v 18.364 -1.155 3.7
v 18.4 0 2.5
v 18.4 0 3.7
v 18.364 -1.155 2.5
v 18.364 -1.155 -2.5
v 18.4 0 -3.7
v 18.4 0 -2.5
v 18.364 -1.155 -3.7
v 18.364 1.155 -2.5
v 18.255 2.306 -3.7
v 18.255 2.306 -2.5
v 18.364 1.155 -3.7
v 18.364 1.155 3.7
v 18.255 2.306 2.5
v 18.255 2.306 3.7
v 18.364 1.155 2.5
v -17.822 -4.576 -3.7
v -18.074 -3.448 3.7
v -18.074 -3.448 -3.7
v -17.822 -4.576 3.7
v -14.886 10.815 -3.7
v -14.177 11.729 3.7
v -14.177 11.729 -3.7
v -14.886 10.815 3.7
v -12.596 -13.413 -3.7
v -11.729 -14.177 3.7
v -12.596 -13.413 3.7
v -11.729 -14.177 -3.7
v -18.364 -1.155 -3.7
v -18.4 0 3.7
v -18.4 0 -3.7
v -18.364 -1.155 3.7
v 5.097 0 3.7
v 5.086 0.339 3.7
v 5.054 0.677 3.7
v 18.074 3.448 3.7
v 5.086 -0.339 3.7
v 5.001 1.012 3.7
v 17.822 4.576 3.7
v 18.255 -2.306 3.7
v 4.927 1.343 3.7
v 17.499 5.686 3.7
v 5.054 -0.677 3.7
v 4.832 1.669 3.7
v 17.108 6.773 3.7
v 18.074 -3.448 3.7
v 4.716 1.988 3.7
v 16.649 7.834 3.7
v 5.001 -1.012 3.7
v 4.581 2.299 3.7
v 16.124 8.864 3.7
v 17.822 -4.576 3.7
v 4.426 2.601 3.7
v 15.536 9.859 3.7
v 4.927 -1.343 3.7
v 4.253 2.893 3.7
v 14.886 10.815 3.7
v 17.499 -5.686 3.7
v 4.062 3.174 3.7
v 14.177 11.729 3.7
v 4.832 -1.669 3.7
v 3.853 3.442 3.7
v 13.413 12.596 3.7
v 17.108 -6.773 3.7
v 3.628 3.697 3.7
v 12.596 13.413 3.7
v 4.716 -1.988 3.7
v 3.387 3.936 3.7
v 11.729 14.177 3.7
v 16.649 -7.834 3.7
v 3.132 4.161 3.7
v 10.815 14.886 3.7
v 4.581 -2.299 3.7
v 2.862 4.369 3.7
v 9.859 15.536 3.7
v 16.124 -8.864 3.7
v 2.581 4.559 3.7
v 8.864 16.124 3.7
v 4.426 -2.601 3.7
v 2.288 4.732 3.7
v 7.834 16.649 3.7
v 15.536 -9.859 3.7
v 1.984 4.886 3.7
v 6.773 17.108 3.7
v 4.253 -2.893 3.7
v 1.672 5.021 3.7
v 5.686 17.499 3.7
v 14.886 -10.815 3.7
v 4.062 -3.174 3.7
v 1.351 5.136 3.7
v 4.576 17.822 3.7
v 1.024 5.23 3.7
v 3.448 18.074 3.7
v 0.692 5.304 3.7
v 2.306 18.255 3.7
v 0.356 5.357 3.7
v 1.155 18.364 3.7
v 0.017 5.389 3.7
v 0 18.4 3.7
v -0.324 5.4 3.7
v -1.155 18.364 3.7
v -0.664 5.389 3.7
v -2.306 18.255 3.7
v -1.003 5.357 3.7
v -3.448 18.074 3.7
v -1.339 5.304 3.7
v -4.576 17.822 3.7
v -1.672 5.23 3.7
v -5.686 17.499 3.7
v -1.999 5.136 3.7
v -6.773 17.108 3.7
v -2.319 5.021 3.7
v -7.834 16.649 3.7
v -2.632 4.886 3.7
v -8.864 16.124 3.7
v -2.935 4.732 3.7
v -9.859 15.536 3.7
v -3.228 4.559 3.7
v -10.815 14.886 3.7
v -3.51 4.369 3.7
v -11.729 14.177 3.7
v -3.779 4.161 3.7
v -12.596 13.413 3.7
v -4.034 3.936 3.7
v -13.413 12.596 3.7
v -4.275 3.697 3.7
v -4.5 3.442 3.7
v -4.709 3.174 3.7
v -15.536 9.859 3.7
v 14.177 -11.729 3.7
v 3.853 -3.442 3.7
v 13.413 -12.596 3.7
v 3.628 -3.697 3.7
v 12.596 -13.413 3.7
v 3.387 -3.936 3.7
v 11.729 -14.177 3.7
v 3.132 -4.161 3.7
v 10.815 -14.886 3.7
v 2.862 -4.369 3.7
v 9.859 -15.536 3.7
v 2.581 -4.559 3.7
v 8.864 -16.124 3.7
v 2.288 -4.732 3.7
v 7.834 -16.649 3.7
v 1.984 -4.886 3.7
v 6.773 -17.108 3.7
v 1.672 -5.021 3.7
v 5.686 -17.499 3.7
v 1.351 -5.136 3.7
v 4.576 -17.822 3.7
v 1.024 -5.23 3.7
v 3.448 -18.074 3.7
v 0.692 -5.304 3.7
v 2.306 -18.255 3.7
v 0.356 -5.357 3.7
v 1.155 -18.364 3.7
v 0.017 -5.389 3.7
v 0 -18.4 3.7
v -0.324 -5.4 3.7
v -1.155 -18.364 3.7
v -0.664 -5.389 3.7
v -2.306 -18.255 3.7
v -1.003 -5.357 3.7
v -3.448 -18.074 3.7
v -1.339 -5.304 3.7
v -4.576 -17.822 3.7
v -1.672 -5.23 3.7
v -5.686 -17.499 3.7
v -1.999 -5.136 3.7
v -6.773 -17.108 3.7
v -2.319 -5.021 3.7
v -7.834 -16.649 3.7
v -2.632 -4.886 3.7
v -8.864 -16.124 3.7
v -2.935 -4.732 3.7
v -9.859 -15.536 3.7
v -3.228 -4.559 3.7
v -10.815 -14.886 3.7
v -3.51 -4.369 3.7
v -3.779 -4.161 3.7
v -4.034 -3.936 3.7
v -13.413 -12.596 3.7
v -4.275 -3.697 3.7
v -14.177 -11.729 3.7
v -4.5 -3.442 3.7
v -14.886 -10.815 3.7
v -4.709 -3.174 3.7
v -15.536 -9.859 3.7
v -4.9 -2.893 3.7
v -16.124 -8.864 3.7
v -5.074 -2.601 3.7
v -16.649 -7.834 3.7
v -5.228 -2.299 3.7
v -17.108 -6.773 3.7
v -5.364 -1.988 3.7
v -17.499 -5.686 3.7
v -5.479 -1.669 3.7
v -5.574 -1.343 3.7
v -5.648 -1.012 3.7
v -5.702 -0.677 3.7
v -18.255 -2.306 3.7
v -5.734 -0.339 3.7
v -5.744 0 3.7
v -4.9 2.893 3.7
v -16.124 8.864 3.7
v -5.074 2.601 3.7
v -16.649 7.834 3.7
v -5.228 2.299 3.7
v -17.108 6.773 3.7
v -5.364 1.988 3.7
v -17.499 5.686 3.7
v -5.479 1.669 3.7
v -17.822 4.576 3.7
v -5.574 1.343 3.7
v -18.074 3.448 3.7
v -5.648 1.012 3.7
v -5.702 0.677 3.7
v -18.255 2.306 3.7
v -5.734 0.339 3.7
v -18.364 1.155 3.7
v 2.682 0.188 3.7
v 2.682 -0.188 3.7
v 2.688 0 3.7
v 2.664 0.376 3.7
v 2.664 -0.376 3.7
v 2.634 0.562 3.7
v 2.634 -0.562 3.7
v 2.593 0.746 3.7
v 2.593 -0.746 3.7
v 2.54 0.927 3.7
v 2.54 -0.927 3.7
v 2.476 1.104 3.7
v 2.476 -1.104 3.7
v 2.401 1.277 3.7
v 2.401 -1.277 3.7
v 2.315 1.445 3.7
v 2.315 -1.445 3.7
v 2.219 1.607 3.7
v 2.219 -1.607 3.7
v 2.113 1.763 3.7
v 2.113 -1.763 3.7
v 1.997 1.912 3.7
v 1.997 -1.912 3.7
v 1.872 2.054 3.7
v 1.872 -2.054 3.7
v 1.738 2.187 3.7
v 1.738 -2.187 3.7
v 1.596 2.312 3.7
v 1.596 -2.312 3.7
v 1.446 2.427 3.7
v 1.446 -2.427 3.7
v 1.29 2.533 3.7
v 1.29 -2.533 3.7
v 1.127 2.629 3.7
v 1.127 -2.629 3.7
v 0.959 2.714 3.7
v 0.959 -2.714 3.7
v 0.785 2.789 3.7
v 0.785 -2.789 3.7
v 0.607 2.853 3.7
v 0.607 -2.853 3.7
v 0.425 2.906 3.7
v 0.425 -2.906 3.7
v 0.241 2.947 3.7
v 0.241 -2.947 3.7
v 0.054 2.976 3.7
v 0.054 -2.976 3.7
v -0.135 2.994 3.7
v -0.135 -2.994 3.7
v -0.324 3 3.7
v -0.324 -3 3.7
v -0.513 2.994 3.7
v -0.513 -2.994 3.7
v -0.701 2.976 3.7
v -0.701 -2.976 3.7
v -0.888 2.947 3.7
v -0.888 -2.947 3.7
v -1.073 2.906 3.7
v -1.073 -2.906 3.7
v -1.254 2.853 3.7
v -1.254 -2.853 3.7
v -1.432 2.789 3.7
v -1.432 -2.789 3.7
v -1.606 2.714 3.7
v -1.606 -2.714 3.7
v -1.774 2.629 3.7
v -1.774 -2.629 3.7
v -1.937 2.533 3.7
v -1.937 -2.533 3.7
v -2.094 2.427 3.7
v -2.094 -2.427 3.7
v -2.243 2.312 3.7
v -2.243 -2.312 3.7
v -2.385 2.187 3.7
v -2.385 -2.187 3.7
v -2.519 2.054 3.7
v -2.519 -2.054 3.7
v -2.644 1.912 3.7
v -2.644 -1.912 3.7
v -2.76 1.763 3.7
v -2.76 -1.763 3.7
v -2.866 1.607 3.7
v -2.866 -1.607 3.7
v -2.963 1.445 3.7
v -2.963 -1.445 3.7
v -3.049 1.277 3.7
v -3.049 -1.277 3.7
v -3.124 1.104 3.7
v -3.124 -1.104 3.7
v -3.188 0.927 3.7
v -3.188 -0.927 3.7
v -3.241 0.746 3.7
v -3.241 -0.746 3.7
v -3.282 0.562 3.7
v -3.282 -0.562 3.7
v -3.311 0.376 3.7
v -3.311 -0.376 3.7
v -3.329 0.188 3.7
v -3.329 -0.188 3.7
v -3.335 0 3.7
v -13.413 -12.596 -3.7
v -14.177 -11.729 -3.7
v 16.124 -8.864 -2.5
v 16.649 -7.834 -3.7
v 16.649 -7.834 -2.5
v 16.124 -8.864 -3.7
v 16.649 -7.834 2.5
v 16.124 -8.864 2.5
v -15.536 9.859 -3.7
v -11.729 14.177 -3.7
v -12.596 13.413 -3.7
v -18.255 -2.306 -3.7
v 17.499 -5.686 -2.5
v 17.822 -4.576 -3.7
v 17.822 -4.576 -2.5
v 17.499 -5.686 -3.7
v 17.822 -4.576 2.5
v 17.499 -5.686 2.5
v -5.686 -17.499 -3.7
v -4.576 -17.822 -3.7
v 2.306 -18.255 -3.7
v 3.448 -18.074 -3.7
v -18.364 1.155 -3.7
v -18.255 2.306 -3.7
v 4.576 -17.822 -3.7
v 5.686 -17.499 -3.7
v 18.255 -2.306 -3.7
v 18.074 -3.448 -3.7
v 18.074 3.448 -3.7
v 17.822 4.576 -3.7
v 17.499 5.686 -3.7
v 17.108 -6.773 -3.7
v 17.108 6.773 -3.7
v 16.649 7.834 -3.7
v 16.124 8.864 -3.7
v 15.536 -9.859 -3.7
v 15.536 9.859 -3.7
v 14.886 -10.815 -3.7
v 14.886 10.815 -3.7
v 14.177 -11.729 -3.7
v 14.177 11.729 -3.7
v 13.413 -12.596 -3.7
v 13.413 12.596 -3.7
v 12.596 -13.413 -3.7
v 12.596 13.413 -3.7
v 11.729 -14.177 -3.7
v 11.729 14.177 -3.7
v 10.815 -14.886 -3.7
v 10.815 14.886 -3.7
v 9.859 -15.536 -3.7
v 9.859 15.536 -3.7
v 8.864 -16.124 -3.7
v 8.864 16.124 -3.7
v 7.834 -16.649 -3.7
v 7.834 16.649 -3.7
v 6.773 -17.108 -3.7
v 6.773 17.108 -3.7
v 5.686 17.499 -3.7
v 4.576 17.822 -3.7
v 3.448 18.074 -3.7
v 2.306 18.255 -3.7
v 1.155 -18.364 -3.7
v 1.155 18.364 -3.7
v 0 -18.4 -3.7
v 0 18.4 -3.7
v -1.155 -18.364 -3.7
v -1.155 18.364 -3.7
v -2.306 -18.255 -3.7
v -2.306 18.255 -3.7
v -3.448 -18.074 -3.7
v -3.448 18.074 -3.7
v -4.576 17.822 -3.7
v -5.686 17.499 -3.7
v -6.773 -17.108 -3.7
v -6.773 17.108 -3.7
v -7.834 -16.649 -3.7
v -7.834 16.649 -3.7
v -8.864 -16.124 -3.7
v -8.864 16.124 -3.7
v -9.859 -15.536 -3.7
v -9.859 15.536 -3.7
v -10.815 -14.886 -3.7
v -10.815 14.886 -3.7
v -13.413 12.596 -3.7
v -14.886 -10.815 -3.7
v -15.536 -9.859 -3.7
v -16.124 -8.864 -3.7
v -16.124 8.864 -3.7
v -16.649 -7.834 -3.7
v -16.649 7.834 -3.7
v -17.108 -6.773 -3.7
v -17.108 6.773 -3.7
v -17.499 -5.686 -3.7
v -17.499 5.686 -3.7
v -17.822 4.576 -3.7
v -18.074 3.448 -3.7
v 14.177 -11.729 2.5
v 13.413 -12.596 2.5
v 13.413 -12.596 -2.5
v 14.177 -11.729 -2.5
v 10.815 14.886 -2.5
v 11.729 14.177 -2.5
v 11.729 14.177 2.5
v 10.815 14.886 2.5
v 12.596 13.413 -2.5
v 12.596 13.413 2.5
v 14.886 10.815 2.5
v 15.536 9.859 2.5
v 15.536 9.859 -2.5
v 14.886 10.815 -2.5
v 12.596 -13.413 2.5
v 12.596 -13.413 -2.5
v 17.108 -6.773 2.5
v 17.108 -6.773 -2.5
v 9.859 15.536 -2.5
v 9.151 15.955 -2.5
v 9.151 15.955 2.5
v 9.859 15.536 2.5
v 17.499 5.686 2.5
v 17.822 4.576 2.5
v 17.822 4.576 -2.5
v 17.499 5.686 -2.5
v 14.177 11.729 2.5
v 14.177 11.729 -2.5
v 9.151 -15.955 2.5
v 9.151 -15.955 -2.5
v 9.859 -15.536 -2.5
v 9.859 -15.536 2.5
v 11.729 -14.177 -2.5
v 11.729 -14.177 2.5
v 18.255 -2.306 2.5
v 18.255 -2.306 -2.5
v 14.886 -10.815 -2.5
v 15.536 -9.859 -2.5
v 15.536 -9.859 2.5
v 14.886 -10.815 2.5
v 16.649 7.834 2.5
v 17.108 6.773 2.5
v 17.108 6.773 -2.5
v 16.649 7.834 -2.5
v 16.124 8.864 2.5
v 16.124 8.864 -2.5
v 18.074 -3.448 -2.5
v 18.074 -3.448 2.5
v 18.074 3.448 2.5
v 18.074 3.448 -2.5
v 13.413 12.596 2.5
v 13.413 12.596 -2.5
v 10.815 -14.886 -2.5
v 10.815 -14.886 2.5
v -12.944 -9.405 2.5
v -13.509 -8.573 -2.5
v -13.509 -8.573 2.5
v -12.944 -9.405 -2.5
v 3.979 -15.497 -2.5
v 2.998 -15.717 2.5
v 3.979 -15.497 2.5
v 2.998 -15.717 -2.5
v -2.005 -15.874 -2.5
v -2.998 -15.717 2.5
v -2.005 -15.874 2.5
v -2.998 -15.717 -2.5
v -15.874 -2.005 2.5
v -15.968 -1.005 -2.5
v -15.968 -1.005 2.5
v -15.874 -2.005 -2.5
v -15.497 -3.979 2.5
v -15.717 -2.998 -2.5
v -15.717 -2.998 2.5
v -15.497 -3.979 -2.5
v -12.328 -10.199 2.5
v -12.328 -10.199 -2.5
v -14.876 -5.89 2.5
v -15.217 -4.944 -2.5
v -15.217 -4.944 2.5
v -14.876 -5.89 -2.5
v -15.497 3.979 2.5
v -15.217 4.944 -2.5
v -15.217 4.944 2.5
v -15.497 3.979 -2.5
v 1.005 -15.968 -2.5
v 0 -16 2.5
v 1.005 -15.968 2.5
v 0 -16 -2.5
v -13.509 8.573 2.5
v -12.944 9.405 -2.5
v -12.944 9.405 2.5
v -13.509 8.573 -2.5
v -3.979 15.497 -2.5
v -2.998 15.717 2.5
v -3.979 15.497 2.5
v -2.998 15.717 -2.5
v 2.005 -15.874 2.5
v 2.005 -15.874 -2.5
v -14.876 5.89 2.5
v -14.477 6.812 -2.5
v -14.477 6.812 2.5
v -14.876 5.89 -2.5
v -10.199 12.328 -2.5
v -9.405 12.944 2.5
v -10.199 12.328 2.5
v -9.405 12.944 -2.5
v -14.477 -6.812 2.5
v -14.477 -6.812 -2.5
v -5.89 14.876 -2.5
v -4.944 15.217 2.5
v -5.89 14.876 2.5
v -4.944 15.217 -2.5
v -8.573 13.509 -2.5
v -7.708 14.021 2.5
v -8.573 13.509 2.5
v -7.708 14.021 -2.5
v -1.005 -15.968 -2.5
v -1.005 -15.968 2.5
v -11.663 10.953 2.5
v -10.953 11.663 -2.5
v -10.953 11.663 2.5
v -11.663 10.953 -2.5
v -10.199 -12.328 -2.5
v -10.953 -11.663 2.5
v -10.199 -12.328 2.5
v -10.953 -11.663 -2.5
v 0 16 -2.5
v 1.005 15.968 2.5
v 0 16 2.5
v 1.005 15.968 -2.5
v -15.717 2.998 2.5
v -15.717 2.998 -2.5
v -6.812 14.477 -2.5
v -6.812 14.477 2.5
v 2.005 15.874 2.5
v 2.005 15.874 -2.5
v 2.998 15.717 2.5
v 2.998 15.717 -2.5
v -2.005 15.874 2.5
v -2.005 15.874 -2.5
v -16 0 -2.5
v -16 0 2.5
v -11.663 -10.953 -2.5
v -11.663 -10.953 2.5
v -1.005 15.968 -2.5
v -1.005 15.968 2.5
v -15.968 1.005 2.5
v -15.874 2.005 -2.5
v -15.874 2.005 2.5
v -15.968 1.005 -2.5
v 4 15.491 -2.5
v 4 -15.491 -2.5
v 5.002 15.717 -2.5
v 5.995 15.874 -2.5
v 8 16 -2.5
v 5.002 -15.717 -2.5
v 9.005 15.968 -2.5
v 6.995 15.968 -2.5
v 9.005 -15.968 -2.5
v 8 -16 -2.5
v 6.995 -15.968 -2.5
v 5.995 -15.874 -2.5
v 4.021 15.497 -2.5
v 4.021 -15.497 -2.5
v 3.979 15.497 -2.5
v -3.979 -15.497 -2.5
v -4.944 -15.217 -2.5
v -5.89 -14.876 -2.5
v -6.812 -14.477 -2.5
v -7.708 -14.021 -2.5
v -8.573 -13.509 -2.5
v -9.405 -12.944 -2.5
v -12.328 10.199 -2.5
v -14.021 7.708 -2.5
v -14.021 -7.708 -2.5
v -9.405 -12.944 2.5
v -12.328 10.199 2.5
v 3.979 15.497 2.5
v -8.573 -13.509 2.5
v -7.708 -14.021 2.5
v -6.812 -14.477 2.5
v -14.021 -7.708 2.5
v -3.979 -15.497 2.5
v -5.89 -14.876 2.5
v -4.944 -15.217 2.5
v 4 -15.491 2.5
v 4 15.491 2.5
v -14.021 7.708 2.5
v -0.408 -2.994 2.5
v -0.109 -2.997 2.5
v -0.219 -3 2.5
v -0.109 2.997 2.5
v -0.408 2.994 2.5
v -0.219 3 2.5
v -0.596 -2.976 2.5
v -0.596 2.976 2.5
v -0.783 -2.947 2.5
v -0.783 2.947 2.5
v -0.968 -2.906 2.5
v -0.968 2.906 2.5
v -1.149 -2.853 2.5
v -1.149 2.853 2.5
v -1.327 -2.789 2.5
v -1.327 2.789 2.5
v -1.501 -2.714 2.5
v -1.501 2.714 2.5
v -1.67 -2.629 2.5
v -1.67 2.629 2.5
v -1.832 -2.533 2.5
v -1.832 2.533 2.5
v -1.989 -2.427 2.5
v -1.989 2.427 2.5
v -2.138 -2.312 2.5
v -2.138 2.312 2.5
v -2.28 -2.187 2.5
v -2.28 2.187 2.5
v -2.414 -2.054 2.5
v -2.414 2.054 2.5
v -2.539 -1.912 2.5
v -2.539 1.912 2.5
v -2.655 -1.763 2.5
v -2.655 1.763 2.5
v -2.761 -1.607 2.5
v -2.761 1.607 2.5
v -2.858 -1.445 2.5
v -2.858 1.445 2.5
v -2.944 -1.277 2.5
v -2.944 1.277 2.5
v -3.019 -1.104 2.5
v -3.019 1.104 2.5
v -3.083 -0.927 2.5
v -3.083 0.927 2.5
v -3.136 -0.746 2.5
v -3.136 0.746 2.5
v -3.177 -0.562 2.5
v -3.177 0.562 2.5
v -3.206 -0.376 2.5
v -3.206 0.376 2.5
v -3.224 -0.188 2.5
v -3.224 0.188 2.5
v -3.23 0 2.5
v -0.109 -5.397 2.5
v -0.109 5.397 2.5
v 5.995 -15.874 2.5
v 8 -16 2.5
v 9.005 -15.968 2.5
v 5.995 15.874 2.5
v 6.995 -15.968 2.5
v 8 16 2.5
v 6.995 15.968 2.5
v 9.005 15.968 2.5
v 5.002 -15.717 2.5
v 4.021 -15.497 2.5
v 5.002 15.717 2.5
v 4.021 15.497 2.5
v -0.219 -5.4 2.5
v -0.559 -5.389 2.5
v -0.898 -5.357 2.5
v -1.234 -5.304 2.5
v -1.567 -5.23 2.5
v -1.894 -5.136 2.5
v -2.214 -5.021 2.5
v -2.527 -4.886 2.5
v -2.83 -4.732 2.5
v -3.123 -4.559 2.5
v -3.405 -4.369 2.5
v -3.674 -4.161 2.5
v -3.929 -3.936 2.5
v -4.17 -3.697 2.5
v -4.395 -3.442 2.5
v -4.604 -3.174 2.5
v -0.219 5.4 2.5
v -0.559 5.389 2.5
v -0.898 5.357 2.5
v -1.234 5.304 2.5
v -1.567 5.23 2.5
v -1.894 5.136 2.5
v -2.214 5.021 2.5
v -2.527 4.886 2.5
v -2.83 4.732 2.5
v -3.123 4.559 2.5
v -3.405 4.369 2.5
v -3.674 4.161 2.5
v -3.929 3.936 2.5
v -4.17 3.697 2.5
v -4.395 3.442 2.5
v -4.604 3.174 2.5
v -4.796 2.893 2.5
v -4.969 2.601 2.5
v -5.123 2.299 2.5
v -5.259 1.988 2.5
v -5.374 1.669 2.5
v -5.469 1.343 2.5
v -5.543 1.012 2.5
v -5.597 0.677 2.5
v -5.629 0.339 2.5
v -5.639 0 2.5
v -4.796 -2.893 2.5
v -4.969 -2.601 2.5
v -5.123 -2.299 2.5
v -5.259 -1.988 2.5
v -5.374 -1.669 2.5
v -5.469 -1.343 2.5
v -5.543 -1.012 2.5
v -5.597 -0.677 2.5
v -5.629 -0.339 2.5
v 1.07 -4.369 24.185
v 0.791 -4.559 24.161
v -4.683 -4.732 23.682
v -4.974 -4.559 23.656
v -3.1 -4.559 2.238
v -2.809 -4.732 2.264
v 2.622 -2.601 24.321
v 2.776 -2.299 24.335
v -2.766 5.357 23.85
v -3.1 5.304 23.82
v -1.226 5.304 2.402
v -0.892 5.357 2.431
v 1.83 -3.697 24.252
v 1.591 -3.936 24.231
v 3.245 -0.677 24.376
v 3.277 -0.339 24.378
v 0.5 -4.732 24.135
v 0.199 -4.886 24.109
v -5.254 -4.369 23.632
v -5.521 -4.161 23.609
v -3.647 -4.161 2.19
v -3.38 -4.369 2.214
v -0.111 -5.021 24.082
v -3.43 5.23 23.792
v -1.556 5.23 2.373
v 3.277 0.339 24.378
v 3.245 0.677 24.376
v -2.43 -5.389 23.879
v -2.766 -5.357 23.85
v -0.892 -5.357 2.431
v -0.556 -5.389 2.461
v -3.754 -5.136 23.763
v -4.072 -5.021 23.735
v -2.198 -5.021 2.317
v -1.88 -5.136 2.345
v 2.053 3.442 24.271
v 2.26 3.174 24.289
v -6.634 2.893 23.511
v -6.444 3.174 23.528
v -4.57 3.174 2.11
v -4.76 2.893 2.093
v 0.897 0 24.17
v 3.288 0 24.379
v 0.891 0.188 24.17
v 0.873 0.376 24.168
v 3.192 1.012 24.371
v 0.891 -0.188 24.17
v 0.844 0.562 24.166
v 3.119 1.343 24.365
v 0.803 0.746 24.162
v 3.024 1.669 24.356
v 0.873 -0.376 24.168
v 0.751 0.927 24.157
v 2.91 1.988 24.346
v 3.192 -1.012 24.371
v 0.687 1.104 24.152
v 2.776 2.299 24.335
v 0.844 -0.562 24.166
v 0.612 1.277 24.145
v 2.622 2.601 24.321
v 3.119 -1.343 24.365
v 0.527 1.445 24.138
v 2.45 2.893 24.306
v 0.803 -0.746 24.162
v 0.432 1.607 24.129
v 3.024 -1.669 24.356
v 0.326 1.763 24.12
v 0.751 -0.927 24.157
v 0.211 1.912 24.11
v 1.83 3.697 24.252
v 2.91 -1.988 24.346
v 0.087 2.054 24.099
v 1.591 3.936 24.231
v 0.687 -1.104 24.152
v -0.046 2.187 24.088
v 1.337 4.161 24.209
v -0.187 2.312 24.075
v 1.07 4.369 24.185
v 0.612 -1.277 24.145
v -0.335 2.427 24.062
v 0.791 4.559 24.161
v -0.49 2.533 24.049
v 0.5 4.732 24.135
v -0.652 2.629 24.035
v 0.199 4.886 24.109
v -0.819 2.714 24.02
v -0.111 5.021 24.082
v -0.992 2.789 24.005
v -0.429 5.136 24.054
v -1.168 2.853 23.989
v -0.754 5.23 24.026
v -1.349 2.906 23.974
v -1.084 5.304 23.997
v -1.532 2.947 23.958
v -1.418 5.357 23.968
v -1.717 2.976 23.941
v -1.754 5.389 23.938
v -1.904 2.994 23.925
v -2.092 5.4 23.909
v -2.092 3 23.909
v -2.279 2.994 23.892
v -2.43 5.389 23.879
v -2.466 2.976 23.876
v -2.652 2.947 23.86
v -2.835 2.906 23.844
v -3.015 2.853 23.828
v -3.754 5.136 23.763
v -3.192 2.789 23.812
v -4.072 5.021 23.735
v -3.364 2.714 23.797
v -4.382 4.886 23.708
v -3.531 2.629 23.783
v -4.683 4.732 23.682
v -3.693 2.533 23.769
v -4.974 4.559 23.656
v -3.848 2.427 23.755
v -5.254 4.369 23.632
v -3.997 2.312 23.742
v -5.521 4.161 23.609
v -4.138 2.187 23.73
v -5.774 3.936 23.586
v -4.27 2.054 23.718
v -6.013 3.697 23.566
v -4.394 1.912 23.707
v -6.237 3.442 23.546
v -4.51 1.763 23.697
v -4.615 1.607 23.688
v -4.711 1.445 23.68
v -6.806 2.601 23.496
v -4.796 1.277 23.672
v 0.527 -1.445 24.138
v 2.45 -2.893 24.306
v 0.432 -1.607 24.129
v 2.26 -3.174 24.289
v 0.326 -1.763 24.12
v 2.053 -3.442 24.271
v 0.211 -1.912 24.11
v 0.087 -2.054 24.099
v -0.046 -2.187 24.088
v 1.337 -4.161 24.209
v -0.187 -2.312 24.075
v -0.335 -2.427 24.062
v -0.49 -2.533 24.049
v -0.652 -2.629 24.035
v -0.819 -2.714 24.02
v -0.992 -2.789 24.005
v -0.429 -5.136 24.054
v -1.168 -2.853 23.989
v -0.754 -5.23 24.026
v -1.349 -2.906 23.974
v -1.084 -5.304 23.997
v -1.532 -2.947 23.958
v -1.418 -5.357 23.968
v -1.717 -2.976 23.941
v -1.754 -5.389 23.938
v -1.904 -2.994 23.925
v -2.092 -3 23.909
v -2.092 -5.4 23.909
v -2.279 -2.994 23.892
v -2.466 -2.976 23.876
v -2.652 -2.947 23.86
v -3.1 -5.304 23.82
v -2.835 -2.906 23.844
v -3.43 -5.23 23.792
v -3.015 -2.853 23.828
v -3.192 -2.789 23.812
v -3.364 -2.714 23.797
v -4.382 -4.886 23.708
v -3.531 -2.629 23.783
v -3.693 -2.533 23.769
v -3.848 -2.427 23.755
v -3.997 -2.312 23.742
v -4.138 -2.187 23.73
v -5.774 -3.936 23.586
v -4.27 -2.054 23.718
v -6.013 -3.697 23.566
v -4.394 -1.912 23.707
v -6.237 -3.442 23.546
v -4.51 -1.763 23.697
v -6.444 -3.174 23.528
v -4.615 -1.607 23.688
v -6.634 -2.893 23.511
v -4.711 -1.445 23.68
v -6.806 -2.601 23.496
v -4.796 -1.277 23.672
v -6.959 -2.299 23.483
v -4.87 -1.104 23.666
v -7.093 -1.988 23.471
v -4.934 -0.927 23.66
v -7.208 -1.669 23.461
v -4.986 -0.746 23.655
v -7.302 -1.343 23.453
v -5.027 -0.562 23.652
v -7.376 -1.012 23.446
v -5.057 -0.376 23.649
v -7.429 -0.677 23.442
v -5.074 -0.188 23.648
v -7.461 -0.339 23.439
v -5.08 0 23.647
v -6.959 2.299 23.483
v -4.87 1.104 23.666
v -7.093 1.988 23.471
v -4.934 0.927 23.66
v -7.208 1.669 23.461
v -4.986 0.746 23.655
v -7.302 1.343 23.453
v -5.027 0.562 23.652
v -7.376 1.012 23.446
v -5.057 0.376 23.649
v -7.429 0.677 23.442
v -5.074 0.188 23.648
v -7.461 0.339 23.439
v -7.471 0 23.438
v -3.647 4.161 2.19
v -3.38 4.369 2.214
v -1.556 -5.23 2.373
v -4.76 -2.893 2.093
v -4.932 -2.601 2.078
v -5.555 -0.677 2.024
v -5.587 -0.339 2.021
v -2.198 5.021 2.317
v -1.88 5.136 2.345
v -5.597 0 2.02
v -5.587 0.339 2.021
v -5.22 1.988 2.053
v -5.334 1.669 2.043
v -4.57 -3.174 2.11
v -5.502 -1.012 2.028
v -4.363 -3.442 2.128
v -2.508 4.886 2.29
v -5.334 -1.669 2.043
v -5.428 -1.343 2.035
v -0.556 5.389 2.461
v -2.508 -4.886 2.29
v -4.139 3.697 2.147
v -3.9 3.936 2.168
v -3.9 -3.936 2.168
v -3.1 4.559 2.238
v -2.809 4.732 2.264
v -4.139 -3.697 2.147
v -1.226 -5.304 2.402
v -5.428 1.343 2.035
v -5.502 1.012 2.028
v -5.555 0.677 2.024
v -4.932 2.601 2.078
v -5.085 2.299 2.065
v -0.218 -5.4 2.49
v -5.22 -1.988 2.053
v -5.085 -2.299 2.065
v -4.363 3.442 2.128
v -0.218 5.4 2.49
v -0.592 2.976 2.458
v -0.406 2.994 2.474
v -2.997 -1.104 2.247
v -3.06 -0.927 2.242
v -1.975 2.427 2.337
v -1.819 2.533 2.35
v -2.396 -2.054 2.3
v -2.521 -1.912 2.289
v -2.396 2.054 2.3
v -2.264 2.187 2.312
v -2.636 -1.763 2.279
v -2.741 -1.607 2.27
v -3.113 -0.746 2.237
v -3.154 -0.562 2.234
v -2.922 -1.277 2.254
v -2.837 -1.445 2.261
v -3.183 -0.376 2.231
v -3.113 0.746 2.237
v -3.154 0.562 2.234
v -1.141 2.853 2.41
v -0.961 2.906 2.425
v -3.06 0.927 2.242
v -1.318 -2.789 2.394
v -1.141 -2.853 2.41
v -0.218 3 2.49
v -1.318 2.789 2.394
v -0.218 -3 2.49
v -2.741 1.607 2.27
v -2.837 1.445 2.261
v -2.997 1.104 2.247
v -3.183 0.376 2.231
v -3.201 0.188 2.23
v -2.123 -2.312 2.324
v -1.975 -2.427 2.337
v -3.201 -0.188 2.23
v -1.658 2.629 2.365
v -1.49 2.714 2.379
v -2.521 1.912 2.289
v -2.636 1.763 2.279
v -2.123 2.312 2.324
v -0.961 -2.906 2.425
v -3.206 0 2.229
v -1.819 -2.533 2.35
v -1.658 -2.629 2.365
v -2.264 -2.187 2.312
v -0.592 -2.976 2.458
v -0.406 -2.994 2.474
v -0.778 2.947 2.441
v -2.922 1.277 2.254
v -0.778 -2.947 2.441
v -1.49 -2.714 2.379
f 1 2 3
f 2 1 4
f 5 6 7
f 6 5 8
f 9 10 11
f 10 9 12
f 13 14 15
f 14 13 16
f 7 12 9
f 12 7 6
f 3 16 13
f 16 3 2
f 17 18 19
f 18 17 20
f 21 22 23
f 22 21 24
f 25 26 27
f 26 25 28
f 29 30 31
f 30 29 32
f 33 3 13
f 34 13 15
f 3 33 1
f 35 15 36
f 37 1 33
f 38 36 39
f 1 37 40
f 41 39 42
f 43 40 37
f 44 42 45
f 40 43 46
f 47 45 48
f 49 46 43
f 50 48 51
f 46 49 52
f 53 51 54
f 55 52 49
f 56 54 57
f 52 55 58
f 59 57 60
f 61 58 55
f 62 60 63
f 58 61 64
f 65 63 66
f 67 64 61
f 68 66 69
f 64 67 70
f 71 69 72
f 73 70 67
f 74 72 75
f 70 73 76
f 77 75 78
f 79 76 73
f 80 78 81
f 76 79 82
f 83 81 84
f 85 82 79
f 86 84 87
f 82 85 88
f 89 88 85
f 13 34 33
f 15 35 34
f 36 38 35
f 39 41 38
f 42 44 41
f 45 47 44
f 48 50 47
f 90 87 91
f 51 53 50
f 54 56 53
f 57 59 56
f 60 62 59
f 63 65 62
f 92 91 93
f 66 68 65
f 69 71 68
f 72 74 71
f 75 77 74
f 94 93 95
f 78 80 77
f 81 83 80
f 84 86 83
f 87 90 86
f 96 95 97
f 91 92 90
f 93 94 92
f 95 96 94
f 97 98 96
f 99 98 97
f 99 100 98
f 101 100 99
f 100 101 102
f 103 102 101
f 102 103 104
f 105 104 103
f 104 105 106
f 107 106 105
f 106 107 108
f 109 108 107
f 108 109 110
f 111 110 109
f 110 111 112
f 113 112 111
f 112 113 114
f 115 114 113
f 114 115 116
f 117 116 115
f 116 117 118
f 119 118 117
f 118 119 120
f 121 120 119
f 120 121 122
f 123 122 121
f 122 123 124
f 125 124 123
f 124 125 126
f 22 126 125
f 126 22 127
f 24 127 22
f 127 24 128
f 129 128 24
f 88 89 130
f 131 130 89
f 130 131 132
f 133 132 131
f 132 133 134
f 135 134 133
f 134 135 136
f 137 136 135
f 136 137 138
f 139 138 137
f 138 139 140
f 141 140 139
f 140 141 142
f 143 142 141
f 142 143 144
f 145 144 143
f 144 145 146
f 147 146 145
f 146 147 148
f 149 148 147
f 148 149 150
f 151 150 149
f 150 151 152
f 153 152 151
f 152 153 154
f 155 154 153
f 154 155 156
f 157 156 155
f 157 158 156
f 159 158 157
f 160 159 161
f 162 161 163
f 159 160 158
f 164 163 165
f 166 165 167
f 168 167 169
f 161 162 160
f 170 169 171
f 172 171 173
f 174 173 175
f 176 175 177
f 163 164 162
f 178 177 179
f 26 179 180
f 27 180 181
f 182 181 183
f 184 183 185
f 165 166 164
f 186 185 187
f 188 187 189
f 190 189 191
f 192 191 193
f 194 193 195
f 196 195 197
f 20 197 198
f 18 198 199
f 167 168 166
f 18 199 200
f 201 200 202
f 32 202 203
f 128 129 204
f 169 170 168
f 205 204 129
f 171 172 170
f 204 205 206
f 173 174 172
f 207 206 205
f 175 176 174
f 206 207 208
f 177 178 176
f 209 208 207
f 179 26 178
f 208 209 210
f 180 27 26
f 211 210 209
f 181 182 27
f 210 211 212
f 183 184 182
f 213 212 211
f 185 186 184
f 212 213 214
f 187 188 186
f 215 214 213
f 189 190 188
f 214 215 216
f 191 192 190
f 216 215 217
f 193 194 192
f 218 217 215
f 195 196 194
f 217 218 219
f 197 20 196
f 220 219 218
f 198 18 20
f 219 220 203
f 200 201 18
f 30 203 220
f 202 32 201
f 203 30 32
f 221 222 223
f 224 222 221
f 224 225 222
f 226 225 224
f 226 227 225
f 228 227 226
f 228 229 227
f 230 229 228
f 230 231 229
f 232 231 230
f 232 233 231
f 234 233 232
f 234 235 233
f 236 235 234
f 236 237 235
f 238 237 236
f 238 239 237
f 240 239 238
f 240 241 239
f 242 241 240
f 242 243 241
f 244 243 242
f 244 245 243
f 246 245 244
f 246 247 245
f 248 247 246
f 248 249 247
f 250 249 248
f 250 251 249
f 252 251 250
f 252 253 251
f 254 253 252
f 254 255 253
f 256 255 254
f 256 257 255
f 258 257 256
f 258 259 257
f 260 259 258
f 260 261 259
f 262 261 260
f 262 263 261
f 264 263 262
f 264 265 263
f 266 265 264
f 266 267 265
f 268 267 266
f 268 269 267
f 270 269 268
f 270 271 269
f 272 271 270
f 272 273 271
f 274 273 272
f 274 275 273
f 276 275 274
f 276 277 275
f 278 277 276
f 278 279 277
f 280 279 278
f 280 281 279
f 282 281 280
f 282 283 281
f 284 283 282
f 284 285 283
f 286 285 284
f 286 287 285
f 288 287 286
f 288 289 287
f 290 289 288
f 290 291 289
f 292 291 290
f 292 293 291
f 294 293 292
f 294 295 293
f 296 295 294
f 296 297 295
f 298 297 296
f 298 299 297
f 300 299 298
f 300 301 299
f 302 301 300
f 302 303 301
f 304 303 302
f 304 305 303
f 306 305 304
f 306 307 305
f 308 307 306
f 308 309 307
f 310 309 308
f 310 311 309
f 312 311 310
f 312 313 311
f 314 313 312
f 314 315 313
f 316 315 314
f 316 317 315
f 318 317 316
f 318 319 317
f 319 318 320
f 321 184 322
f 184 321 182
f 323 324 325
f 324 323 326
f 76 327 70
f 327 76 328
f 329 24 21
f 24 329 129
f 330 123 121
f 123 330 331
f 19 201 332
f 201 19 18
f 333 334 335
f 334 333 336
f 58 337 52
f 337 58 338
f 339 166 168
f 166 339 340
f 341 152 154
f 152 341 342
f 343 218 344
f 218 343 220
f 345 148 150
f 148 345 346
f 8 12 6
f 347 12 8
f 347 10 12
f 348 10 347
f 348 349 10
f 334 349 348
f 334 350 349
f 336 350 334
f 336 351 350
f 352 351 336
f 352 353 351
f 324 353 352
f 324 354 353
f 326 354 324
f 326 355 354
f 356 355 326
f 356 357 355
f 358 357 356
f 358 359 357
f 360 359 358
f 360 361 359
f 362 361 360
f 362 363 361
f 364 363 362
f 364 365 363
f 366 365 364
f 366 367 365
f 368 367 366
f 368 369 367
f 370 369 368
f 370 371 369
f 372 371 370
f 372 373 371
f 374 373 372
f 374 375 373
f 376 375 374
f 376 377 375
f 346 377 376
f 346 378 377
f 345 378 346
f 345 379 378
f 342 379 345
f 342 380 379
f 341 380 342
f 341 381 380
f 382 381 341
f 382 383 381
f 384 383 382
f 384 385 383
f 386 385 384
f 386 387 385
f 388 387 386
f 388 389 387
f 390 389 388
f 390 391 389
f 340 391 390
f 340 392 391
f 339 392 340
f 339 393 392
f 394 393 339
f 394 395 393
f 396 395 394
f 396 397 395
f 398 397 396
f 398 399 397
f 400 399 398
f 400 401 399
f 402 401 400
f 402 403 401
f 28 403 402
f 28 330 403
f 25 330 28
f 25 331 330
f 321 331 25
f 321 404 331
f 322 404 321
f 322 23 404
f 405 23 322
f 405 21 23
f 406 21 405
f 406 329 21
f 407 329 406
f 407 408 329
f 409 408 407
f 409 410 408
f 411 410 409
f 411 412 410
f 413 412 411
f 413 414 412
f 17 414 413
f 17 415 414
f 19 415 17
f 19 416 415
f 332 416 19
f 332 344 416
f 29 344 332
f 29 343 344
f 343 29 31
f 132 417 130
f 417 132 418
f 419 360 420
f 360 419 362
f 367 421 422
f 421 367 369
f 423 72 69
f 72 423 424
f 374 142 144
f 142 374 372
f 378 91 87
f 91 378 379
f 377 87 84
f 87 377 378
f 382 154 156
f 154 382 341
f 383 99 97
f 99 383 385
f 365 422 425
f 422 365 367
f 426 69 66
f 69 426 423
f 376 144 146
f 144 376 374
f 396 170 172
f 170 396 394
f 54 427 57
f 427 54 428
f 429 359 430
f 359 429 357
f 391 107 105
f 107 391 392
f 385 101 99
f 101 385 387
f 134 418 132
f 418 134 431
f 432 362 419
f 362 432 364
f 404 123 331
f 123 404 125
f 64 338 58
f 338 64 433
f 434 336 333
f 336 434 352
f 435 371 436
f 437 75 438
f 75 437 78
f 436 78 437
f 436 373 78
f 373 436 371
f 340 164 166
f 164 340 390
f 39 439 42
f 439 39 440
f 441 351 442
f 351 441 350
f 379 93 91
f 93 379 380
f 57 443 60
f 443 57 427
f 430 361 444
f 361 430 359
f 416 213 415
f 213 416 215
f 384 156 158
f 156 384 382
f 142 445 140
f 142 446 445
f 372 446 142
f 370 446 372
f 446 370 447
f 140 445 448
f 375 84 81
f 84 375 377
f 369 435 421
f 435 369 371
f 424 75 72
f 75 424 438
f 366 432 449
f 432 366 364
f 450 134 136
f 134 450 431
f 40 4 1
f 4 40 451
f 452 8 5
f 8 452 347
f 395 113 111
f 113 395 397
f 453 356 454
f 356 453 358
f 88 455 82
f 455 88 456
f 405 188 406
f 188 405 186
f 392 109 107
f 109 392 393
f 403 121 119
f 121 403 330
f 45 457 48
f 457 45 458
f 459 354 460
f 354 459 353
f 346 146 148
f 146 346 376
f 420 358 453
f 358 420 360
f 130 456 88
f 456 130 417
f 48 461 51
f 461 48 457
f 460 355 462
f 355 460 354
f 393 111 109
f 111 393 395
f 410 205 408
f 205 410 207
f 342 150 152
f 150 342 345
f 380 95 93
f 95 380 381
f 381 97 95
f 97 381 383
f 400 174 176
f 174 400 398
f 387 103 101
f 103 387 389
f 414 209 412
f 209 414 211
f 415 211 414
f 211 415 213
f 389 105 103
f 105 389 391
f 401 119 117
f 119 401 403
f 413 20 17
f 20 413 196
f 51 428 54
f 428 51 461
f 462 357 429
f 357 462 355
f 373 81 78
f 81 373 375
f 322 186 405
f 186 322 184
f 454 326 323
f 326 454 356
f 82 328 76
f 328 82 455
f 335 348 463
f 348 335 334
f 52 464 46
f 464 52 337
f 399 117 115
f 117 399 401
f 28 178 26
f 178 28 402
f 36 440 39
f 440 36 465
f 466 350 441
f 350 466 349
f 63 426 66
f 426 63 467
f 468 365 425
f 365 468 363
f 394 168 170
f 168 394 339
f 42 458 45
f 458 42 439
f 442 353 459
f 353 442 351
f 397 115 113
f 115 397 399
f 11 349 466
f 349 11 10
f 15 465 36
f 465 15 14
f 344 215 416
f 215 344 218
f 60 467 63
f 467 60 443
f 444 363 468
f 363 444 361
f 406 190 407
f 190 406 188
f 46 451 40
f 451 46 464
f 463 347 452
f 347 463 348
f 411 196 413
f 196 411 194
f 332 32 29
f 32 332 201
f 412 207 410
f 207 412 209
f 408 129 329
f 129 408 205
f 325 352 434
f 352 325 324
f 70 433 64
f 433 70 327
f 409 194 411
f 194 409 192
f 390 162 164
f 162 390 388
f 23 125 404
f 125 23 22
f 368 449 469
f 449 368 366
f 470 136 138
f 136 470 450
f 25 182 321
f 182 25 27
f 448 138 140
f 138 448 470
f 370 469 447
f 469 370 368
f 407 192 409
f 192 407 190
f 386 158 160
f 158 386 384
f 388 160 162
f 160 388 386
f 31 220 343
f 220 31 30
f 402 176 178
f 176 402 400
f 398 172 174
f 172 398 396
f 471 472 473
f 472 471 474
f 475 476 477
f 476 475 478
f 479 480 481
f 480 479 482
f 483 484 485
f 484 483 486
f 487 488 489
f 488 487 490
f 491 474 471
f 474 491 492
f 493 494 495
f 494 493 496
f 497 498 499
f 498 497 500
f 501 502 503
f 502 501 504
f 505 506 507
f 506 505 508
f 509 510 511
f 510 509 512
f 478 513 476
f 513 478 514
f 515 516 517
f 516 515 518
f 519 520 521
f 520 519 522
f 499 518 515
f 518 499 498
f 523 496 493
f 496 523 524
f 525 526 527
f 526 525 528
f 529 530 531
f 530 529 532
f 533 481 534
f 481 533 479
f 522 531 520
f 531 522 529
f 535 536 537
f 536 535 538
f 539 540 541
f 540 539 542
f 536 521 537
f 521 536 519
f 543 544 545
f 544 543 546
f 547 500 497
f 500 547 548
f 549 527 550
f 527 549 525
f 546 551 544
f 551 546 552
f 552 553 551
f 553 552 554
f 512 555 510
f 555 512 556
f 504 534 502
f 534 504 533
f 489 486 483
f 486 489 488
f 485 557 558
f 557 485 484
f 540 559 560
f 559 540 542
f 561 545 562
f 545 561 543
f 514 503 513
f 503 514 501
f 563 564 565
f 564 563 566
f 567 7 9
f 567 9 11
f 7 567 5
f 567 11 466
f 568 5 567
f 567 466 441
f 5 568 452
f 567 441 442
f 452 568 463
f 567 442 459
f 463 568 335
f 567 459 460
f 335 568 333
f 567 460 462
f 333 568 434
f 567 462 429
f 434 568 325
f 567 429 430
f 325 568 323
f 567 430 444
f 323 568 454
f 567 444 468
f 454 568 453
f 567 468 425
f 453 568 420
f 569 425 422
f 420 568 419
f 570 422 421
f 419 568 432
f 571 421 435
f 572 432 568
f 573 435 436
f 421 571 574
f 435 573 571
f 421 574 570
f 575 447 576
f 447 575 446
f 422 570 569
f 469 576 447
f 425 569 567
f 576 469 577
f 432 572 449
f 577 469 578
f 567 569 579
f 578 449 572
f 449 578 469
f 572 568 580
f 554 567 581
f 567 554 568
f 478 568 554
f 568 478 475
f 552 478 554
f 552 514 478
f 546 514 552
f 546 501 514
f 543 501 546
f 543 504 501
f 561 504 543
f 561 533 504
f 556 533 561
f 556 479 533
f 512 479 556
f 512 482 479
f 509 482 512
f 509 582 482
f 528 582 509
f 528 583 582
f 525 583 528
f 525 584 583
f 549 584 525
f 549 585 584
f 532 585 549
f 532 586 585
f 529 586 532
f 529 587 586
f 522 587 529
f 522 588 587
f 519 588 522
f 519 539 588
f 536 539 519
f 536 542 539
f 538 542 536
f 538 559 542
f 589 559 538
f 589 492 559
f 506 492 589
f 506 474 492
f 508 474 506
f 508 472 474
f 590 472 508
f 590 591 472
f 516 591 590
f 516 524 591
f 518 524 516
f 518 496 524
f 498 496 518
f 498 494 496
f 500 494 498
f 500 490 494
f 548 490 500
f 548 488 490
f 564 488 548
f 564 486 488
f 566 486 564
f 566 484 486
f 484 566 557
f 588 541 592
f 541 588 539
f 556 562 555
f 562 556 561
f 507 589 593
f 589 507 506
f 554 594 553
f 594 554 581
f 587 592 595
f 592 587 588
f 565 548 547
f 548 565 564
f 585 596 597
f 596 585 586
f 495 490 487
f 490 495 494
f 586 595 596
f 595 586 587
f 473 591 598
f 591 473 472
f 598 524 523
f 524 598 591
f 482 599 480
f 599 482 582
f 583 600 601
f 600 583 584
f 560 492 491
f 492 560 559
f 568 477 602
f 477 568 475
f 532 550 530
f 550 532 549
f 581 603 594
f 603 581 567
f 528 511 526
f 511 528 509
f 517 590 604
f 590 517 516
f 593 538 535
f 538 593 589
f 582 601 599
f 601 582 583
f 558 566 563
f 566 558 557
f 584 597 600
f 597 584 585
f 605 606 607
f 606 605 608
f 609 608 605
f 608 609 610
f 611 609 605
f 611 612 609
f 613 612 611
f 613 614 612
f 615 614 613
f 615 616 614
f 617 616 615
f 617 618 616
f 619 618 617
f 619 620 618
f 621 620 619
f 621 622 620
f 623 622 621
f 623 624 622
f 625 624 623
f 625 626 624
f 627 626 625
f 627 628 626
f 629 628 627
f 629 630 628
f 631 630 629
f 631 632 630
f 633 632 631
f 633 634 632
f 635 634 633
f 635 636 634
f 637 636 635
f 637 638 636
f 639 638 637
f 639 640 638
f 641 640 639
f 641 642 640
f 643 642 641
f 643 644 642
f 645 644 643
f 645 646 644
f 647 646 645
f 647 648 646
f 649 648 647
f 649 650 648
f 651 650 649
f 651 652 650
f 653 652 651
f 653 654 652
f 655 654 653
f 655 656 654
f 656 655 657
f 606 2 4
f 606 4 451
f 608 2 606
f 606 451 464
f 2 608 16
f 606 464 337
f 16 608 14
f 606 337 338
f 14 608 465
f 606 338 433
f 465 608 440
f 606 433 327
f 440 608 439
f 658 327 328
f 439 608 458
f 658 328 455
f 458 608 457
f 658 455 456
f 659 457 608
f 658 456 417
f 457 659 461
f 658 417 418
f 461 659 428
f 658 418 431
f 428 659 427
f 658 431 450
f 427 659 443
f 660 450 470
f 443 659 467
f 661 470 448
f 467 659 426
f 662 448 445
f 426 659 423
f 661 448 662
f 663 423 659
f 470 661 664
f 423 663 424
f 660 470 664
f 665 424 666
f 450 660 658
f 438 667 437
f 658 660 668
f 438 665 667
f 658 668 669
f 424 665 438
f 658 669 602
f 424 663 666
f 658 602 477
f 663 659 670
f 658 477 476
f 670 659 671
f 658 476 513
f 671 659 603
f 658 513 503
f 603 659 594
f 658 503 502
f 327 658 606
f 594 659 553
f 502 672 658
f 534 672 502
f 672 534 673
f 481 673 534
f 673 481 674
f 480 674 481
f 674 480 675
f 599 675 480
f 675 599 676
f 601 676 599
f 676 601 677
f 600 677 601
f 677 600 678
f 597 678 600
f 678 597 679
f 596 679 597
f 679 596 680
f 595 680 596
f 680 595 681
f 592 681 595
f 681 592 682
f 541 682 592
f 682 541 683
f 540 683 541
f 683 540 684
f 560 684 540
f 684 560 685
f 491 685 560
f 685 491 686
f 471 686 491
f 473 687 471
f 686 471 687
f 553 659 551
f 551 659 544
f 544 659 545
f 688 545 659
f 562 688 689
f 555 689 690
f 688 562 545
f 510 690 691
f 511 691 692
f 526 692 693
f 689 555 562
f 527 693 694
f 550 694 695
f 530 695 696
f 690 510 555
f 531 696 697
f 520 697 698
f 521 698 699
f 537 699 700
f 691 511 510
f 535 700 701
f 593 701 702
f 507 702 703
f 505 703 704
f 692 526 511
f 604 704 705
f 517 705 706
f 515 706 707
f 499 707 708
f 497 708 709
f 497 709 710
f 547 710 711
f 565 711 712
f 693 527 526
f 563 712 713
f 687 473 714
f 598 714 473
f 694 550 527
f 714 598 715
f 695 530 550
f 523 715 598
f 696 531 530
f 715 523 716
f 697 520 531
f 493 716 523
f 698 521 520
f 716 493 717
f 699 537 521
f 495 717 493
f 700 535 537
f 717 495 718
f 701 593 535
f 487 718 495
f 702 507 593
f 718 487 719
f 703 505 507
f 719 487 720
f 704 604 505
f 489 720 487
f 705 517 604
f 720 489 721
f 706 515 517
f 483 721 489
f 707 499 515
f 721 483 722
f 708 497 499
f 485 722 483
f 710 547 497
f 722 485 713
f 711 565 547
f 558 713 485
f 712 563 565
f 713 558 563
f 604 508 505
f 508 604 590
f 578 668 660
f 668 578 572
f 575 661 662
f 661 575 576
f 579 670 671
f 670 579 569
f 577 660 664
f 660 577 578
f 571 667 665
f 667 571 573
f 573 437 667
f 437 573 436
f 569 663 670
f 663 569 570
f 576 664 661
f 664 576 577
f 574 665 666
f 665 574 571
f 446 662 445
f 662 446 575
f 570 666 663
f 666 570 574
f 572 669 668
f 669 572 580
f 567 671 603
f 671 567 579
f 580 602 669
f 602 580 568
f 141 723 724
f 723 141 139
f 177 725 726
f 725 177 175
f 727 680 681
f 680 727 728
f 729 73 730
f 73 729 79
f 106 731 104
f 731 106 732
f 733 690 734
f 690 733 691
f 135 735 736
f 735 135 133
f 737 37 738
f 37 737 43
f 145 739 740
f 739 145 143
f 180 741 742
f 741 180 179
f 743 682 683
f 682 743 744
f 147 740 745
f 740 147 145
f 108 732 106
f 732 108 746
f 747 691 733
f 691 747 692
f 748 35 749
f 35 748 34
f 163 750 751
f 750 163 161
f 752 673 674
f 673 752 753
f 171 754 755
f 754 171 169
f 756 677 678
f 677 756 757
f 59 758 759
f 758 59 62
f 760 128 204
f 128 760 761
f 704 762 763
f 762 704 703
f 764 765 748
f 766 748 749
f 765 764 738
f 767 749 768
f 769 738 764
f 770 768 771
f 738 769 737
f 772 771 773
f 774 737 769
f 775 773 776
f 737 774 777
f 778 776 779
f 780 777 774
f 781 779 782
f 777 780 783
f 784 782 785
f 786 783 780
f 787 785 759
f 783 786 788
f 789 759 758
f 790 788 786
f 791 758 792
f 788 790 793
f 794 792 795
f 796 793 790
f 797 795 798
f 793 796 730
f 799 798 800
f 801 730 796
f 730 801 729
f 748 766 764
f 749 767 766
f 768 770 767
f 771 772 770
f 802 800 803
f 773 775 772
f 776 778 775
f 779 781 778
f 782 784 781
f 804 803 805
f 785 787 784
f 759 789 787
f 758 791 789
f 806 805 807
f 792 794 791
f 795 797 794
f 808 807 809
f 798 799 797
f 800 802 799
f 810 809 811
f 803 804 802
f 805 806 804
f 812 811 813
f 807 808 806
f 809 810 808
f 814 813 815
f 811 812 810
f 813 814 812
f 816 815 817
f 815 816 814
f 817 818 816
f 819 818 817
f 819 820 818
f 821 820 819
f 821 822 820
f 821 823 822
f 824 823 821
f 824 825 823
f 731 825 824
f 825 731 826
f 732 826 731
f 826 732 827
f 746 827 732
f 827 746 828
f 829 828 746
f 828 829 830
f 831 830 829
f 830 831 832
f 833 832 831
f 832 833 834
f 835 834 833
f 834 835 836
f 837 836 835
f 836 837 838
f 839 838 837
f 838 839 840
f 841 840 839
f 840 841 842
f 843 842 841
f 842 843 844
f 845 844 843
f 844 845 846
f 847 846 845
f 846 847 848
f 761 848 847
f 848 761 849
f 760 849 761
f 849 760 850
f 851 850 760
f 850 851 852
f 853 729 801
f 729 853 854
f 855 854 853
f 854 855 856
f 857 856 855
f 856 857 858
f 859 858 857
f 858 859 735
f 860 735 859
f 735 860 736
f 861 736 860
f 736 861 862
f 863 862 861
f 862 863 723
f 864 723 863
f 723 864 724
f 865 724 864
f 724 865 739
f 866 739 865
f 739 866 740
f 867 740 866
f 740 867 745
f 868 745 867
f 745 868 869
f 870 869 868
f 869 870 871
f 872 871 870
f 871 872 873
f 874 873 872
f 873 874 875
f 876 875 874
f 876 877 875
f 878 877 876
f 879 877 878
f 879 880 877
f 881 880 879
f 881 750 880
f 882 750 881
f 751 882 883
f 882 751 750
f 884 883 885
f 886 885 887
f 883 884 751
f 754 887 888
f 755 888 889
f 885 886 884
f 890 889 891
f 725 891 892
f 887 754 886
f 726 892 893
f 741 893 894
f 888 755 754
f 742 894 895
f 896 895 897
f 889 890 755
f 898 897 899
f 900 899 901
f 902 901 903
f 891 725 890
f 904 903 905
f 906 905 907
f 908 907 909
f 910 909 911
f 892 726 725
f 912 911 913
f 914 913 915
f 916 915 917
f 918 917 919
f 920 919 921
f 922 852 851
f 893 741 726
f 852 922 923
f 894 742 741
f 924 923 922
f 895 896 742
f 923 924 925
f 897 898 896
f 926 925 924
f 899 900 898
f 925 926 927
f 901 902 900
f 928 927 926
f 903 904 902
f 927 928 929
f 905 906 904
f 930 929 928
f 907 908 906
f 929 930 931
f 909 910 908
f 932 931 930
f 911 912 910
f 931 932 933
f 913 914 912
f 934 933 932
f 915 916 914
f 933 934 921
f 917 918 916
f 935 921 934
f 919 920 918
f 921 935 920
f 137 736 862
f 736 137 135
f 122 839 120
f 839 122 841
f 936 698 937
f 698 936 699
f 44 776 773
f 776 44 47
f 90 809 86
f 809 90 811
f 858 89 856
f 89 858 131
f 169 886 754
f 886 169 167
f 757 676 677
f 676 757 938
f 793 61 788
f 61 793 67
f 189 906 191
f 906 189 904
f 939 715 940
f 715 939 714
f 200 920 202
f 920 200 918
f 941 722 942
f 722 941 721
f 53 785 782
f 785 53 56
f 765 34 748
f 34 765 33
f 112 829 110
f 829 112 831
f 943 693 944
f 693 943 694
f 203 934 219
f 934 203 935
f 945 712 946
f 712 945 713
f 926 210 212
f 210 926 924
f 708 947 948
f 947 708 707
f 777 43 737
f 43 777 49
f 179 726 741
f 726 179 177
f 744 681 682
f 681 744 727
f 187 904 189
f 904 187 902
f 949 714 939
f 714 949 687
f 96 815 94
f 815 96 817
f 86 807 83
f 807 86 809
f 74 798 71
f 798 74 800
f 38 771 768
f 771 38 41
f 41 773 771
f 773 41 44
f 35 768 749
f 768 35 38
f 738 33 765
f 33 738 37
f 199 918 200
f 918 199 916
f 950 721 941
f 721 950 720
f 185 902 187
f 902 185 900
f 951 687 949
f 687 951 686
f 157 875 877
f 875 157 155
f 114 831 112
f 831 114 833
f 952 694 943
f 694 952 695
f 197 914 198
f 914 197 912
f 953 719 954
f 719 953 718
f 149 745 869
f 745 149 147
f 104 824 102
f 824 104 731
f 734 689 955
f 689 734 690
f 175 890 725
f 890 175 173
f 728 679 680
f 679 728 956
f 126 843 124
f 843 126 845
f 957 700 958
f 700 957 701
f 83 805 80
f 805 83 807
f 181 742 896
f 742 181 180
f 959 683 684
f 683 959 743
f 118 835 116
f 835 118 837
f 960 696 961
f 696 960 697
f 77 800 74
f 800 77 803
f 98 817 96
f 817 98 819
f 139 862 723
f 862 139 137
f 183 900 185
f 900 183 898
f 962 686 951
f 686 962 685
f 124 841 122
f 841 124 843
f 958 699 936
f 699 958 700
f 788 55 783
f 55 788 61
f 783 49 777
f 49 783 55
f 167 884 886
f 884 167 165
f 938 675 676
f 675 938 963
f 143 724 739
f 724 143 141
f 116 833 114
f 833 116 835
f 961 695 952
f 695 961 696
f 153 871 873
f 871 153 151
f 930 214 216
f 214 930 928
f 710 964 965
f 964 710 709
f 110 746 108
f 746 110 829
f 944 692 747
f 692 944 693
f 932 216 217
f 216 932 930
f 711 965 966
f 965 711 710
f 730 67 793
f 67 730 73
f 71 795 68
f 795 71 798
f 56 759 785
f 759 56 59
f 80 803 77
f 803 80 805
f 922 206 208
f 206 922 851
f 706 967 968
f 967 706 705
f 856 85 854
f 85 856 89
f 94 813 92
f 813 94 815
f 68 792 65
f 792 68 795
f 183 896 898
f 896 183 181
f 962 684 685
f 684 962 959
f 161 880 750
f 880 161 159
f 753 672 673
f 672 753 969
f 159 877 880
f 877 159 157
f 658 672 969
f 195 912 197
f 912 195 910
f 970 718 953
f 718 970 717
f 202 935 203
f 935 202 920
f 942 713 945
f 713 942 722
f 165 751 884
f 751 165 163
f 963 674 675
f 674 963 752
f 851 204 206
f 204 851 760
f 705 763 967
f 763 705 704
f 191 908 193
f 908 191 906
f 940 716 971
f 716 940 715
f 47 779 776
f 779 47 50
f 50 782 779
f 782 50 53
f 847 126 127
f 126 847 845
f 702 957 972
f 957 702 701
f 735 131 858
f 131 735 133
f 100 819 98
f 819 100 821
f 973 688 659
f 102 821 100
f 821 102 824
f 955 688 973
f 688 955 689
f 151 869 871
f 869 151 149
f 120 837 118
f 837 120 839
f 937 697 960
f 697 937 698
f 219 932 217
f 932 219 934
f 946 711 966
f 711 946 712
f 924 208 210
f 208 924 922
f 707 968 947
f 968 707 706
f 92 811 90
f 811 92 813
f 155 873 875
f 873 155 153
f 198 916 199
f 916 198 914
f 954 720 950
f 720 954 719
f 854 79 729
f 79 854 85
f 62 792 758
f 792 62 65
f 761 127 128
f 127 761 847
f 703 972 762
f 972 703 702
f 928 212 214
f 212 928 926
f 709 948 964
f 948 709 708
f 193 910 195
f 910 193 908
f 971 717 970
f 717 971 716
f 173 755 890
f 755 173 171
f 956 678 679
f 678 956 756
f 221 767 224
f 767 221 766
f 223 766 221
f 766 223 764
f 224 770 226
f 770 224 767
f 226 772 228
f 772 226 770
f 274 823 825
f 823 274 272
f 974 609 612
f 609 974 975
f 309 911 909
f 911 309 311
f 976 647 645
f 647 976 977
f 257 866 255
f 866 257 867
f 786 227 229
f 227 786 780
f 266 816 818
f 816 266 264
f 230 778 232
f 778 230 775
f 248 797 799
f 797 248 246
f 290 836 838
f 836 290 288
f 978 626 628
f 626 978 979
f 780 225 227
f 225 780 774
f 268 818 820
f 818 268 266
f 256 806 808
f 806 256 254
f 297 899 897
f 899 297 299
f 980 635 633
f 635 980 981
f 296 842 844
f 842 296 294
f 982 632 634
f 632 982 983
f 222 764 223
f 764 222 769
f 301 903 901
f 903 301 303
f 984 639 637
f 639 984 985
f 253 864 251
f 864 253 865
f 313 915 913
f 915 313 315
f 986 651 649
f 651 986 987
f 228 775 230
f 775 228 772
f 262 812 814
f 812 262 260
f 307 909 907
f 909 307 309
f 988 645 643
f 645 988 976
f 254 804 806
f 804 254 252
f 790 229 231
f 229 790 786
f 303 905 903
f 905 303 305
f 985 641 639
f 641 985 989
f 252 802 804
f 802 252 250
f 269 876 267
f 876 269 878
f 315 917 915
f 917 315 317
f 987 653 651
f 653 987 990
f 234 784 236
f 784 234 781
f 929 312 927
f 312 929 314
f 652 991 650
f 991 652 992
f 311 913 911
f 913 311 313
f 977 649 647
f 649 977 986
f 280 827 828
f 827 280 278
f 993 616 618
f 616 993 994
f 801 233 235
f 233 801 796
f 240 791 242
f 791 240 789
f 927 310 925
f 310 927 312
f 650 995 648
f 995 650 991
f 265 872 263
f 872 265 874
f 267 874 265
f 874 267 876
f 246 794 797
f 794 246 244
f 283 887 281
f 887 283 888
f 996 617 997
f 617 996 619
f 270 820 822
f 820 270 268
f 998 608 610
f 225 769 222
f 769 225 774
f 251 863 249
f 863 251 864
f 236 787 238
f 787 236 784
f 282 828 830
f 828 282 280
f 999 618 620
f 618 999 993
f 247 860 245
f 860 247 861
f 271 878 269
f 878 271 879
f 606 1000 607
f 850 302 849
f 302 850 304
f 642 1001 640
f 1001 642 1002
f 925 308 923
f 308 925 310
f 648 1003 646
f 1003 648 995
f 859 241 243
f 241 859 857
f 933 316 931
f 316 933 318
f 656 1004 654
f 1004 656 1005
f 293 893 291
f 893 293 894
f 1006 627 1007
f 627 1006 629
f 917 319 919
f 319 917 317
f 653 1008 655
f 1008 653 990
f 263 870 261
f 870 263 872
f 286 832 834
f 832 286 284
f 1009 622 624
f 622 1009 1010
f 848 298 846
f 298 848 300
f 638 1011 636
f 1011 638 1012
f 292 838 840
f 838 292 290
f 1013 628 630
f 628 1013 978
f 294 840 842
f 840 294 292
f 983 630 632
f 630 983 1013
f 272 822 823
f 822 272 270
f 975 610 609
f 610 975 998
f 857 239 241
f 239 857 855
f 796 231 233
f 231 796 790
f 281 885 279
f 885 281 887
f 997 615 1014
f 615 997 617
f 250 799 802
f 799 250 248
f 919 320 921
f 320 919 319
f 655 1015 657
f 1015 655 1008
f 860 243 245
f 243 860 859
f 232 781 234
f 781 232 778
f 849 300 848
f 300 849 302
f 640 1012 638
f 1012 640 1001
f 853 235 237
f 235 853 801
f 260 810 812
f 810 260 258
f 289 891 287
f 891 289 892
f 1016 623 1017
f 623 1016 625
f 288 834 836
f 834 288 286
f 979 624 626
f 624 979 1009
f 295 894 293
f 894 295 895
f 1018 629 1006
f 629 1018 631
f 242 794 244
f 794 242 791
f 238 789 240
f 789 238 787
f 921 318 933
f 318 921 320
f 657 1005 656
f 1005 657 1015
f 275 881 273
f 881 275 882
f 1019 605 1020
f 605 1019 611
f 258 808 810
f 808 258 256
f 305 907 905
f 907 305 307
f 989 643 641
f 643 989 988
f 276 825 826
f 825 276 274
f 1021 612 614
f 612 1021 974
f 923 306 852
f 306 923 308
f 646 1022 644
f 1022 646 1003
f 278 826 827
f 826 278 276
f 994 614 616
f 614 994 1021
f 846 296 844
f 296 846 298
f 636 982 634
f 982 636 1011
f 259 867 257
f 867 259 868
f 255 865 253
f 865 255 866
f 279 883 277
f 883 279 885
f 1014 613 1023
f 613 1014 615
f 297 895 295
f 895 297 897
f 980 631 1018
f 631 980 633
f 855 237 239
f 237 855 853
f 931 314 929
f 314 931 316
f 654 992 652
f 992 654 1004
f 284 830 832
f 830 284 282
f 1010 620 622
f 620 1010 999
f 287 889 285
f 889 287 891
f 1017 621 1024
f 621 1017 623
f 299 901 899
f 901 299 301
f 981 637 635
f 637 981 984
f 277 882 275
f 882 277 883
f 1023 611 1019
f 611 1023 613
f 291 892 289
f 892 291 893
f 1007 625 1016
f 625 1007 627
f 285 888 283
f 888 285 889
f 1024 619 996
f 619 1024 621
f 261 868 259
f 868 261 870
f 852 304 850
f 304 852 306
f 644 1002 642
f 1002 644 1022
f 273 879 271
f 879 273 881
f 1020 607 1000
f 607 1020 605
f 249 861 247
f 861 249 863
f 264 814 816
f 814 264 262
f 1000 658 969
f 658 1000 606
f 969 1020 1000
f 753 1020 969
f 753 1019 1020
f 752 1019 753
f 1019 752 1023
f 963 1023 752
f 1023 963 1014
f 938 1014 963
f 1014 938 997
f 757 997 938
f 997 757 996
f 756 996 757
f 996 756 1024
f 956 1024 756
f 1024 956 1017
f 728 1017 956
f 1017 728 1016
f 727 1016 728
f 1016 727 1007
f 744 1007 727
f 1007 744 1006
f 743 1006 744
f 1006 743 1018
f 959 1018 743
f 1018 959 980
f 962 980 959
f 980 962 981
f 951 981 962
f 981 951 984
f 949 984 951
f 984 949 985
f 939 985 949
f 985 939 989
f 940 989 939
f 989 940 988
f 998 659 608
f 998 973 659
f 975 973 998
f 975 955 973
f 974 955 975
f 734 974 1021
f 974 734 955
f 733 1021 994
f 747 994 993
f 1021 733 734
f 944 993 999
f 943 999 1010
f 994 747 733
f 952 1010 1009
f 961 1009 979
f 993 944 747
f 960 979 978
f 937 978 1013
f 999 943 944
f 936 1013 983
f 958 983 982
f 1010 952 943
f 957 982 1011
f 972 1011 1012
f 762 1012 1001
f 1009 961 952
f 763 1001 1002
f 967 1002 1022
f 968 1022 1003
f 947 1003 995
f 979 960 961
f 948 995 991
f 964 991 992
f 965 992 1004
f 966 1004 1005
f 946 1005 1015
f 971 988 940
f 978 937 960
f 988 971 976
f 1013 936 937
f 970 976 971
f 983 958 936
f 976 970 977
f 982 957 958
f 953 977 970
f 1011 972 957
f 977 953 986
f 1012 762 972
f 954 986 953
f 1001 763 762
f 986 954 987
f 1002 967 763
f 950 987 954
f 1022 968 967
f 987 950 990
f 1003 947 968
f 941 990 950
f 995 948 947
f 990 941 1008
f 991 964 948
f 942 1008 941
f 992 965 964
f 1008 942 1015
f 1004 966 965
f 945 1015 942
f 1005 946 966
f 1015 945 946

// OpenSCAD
MAGNET_RADIUS = 16;
MAGNET_HEIGHT = 5;
SHELL_WIDTH = 1.2;
FLAG_RADIUS = 3;
$fn=100;
module magnet()
    cylinder(h = MAGNET_HEIGHT, r = MAGNET_RADIUS, center = true);
    
module angle_text(){
    text_size = 4;
    translate([-100/2,-text_size/2,-text_size/2])
    rotate([90,0,90])
    linear_extrude(height = 100) {
           text(text = "5°", size = text_size);
    }
}

difference(){
    cylinder(h = MAGNET_HEIGHT+SHELL_WIDTH*2, r = MAGNET_RADIUS + SHELL_WIDTH*2, center = true);
    magnet();
    translate([MAGNET_RADIUS/2,0,0])
    magnet();
    //angle_text();
}



FLAG_HEIGHT = 300;
MOUNT_HEIGHT = 24;
module flag()
    translate([0,0,FLAG_HEIGHT/2])cylinder(h = FLAG_HEIGHT, r = FLAG_RADIUS, center = true);

rotate([0,-5,0]){
    difference(){
        translate([0,0,MOUNT_HEIGHT/2]) cylinder(h = MOUNT_HEIGHT, r = FLAG_RADIUS+SHELL_WIDTH*2, center = true);
        flag();
        magnet();
    }
}
